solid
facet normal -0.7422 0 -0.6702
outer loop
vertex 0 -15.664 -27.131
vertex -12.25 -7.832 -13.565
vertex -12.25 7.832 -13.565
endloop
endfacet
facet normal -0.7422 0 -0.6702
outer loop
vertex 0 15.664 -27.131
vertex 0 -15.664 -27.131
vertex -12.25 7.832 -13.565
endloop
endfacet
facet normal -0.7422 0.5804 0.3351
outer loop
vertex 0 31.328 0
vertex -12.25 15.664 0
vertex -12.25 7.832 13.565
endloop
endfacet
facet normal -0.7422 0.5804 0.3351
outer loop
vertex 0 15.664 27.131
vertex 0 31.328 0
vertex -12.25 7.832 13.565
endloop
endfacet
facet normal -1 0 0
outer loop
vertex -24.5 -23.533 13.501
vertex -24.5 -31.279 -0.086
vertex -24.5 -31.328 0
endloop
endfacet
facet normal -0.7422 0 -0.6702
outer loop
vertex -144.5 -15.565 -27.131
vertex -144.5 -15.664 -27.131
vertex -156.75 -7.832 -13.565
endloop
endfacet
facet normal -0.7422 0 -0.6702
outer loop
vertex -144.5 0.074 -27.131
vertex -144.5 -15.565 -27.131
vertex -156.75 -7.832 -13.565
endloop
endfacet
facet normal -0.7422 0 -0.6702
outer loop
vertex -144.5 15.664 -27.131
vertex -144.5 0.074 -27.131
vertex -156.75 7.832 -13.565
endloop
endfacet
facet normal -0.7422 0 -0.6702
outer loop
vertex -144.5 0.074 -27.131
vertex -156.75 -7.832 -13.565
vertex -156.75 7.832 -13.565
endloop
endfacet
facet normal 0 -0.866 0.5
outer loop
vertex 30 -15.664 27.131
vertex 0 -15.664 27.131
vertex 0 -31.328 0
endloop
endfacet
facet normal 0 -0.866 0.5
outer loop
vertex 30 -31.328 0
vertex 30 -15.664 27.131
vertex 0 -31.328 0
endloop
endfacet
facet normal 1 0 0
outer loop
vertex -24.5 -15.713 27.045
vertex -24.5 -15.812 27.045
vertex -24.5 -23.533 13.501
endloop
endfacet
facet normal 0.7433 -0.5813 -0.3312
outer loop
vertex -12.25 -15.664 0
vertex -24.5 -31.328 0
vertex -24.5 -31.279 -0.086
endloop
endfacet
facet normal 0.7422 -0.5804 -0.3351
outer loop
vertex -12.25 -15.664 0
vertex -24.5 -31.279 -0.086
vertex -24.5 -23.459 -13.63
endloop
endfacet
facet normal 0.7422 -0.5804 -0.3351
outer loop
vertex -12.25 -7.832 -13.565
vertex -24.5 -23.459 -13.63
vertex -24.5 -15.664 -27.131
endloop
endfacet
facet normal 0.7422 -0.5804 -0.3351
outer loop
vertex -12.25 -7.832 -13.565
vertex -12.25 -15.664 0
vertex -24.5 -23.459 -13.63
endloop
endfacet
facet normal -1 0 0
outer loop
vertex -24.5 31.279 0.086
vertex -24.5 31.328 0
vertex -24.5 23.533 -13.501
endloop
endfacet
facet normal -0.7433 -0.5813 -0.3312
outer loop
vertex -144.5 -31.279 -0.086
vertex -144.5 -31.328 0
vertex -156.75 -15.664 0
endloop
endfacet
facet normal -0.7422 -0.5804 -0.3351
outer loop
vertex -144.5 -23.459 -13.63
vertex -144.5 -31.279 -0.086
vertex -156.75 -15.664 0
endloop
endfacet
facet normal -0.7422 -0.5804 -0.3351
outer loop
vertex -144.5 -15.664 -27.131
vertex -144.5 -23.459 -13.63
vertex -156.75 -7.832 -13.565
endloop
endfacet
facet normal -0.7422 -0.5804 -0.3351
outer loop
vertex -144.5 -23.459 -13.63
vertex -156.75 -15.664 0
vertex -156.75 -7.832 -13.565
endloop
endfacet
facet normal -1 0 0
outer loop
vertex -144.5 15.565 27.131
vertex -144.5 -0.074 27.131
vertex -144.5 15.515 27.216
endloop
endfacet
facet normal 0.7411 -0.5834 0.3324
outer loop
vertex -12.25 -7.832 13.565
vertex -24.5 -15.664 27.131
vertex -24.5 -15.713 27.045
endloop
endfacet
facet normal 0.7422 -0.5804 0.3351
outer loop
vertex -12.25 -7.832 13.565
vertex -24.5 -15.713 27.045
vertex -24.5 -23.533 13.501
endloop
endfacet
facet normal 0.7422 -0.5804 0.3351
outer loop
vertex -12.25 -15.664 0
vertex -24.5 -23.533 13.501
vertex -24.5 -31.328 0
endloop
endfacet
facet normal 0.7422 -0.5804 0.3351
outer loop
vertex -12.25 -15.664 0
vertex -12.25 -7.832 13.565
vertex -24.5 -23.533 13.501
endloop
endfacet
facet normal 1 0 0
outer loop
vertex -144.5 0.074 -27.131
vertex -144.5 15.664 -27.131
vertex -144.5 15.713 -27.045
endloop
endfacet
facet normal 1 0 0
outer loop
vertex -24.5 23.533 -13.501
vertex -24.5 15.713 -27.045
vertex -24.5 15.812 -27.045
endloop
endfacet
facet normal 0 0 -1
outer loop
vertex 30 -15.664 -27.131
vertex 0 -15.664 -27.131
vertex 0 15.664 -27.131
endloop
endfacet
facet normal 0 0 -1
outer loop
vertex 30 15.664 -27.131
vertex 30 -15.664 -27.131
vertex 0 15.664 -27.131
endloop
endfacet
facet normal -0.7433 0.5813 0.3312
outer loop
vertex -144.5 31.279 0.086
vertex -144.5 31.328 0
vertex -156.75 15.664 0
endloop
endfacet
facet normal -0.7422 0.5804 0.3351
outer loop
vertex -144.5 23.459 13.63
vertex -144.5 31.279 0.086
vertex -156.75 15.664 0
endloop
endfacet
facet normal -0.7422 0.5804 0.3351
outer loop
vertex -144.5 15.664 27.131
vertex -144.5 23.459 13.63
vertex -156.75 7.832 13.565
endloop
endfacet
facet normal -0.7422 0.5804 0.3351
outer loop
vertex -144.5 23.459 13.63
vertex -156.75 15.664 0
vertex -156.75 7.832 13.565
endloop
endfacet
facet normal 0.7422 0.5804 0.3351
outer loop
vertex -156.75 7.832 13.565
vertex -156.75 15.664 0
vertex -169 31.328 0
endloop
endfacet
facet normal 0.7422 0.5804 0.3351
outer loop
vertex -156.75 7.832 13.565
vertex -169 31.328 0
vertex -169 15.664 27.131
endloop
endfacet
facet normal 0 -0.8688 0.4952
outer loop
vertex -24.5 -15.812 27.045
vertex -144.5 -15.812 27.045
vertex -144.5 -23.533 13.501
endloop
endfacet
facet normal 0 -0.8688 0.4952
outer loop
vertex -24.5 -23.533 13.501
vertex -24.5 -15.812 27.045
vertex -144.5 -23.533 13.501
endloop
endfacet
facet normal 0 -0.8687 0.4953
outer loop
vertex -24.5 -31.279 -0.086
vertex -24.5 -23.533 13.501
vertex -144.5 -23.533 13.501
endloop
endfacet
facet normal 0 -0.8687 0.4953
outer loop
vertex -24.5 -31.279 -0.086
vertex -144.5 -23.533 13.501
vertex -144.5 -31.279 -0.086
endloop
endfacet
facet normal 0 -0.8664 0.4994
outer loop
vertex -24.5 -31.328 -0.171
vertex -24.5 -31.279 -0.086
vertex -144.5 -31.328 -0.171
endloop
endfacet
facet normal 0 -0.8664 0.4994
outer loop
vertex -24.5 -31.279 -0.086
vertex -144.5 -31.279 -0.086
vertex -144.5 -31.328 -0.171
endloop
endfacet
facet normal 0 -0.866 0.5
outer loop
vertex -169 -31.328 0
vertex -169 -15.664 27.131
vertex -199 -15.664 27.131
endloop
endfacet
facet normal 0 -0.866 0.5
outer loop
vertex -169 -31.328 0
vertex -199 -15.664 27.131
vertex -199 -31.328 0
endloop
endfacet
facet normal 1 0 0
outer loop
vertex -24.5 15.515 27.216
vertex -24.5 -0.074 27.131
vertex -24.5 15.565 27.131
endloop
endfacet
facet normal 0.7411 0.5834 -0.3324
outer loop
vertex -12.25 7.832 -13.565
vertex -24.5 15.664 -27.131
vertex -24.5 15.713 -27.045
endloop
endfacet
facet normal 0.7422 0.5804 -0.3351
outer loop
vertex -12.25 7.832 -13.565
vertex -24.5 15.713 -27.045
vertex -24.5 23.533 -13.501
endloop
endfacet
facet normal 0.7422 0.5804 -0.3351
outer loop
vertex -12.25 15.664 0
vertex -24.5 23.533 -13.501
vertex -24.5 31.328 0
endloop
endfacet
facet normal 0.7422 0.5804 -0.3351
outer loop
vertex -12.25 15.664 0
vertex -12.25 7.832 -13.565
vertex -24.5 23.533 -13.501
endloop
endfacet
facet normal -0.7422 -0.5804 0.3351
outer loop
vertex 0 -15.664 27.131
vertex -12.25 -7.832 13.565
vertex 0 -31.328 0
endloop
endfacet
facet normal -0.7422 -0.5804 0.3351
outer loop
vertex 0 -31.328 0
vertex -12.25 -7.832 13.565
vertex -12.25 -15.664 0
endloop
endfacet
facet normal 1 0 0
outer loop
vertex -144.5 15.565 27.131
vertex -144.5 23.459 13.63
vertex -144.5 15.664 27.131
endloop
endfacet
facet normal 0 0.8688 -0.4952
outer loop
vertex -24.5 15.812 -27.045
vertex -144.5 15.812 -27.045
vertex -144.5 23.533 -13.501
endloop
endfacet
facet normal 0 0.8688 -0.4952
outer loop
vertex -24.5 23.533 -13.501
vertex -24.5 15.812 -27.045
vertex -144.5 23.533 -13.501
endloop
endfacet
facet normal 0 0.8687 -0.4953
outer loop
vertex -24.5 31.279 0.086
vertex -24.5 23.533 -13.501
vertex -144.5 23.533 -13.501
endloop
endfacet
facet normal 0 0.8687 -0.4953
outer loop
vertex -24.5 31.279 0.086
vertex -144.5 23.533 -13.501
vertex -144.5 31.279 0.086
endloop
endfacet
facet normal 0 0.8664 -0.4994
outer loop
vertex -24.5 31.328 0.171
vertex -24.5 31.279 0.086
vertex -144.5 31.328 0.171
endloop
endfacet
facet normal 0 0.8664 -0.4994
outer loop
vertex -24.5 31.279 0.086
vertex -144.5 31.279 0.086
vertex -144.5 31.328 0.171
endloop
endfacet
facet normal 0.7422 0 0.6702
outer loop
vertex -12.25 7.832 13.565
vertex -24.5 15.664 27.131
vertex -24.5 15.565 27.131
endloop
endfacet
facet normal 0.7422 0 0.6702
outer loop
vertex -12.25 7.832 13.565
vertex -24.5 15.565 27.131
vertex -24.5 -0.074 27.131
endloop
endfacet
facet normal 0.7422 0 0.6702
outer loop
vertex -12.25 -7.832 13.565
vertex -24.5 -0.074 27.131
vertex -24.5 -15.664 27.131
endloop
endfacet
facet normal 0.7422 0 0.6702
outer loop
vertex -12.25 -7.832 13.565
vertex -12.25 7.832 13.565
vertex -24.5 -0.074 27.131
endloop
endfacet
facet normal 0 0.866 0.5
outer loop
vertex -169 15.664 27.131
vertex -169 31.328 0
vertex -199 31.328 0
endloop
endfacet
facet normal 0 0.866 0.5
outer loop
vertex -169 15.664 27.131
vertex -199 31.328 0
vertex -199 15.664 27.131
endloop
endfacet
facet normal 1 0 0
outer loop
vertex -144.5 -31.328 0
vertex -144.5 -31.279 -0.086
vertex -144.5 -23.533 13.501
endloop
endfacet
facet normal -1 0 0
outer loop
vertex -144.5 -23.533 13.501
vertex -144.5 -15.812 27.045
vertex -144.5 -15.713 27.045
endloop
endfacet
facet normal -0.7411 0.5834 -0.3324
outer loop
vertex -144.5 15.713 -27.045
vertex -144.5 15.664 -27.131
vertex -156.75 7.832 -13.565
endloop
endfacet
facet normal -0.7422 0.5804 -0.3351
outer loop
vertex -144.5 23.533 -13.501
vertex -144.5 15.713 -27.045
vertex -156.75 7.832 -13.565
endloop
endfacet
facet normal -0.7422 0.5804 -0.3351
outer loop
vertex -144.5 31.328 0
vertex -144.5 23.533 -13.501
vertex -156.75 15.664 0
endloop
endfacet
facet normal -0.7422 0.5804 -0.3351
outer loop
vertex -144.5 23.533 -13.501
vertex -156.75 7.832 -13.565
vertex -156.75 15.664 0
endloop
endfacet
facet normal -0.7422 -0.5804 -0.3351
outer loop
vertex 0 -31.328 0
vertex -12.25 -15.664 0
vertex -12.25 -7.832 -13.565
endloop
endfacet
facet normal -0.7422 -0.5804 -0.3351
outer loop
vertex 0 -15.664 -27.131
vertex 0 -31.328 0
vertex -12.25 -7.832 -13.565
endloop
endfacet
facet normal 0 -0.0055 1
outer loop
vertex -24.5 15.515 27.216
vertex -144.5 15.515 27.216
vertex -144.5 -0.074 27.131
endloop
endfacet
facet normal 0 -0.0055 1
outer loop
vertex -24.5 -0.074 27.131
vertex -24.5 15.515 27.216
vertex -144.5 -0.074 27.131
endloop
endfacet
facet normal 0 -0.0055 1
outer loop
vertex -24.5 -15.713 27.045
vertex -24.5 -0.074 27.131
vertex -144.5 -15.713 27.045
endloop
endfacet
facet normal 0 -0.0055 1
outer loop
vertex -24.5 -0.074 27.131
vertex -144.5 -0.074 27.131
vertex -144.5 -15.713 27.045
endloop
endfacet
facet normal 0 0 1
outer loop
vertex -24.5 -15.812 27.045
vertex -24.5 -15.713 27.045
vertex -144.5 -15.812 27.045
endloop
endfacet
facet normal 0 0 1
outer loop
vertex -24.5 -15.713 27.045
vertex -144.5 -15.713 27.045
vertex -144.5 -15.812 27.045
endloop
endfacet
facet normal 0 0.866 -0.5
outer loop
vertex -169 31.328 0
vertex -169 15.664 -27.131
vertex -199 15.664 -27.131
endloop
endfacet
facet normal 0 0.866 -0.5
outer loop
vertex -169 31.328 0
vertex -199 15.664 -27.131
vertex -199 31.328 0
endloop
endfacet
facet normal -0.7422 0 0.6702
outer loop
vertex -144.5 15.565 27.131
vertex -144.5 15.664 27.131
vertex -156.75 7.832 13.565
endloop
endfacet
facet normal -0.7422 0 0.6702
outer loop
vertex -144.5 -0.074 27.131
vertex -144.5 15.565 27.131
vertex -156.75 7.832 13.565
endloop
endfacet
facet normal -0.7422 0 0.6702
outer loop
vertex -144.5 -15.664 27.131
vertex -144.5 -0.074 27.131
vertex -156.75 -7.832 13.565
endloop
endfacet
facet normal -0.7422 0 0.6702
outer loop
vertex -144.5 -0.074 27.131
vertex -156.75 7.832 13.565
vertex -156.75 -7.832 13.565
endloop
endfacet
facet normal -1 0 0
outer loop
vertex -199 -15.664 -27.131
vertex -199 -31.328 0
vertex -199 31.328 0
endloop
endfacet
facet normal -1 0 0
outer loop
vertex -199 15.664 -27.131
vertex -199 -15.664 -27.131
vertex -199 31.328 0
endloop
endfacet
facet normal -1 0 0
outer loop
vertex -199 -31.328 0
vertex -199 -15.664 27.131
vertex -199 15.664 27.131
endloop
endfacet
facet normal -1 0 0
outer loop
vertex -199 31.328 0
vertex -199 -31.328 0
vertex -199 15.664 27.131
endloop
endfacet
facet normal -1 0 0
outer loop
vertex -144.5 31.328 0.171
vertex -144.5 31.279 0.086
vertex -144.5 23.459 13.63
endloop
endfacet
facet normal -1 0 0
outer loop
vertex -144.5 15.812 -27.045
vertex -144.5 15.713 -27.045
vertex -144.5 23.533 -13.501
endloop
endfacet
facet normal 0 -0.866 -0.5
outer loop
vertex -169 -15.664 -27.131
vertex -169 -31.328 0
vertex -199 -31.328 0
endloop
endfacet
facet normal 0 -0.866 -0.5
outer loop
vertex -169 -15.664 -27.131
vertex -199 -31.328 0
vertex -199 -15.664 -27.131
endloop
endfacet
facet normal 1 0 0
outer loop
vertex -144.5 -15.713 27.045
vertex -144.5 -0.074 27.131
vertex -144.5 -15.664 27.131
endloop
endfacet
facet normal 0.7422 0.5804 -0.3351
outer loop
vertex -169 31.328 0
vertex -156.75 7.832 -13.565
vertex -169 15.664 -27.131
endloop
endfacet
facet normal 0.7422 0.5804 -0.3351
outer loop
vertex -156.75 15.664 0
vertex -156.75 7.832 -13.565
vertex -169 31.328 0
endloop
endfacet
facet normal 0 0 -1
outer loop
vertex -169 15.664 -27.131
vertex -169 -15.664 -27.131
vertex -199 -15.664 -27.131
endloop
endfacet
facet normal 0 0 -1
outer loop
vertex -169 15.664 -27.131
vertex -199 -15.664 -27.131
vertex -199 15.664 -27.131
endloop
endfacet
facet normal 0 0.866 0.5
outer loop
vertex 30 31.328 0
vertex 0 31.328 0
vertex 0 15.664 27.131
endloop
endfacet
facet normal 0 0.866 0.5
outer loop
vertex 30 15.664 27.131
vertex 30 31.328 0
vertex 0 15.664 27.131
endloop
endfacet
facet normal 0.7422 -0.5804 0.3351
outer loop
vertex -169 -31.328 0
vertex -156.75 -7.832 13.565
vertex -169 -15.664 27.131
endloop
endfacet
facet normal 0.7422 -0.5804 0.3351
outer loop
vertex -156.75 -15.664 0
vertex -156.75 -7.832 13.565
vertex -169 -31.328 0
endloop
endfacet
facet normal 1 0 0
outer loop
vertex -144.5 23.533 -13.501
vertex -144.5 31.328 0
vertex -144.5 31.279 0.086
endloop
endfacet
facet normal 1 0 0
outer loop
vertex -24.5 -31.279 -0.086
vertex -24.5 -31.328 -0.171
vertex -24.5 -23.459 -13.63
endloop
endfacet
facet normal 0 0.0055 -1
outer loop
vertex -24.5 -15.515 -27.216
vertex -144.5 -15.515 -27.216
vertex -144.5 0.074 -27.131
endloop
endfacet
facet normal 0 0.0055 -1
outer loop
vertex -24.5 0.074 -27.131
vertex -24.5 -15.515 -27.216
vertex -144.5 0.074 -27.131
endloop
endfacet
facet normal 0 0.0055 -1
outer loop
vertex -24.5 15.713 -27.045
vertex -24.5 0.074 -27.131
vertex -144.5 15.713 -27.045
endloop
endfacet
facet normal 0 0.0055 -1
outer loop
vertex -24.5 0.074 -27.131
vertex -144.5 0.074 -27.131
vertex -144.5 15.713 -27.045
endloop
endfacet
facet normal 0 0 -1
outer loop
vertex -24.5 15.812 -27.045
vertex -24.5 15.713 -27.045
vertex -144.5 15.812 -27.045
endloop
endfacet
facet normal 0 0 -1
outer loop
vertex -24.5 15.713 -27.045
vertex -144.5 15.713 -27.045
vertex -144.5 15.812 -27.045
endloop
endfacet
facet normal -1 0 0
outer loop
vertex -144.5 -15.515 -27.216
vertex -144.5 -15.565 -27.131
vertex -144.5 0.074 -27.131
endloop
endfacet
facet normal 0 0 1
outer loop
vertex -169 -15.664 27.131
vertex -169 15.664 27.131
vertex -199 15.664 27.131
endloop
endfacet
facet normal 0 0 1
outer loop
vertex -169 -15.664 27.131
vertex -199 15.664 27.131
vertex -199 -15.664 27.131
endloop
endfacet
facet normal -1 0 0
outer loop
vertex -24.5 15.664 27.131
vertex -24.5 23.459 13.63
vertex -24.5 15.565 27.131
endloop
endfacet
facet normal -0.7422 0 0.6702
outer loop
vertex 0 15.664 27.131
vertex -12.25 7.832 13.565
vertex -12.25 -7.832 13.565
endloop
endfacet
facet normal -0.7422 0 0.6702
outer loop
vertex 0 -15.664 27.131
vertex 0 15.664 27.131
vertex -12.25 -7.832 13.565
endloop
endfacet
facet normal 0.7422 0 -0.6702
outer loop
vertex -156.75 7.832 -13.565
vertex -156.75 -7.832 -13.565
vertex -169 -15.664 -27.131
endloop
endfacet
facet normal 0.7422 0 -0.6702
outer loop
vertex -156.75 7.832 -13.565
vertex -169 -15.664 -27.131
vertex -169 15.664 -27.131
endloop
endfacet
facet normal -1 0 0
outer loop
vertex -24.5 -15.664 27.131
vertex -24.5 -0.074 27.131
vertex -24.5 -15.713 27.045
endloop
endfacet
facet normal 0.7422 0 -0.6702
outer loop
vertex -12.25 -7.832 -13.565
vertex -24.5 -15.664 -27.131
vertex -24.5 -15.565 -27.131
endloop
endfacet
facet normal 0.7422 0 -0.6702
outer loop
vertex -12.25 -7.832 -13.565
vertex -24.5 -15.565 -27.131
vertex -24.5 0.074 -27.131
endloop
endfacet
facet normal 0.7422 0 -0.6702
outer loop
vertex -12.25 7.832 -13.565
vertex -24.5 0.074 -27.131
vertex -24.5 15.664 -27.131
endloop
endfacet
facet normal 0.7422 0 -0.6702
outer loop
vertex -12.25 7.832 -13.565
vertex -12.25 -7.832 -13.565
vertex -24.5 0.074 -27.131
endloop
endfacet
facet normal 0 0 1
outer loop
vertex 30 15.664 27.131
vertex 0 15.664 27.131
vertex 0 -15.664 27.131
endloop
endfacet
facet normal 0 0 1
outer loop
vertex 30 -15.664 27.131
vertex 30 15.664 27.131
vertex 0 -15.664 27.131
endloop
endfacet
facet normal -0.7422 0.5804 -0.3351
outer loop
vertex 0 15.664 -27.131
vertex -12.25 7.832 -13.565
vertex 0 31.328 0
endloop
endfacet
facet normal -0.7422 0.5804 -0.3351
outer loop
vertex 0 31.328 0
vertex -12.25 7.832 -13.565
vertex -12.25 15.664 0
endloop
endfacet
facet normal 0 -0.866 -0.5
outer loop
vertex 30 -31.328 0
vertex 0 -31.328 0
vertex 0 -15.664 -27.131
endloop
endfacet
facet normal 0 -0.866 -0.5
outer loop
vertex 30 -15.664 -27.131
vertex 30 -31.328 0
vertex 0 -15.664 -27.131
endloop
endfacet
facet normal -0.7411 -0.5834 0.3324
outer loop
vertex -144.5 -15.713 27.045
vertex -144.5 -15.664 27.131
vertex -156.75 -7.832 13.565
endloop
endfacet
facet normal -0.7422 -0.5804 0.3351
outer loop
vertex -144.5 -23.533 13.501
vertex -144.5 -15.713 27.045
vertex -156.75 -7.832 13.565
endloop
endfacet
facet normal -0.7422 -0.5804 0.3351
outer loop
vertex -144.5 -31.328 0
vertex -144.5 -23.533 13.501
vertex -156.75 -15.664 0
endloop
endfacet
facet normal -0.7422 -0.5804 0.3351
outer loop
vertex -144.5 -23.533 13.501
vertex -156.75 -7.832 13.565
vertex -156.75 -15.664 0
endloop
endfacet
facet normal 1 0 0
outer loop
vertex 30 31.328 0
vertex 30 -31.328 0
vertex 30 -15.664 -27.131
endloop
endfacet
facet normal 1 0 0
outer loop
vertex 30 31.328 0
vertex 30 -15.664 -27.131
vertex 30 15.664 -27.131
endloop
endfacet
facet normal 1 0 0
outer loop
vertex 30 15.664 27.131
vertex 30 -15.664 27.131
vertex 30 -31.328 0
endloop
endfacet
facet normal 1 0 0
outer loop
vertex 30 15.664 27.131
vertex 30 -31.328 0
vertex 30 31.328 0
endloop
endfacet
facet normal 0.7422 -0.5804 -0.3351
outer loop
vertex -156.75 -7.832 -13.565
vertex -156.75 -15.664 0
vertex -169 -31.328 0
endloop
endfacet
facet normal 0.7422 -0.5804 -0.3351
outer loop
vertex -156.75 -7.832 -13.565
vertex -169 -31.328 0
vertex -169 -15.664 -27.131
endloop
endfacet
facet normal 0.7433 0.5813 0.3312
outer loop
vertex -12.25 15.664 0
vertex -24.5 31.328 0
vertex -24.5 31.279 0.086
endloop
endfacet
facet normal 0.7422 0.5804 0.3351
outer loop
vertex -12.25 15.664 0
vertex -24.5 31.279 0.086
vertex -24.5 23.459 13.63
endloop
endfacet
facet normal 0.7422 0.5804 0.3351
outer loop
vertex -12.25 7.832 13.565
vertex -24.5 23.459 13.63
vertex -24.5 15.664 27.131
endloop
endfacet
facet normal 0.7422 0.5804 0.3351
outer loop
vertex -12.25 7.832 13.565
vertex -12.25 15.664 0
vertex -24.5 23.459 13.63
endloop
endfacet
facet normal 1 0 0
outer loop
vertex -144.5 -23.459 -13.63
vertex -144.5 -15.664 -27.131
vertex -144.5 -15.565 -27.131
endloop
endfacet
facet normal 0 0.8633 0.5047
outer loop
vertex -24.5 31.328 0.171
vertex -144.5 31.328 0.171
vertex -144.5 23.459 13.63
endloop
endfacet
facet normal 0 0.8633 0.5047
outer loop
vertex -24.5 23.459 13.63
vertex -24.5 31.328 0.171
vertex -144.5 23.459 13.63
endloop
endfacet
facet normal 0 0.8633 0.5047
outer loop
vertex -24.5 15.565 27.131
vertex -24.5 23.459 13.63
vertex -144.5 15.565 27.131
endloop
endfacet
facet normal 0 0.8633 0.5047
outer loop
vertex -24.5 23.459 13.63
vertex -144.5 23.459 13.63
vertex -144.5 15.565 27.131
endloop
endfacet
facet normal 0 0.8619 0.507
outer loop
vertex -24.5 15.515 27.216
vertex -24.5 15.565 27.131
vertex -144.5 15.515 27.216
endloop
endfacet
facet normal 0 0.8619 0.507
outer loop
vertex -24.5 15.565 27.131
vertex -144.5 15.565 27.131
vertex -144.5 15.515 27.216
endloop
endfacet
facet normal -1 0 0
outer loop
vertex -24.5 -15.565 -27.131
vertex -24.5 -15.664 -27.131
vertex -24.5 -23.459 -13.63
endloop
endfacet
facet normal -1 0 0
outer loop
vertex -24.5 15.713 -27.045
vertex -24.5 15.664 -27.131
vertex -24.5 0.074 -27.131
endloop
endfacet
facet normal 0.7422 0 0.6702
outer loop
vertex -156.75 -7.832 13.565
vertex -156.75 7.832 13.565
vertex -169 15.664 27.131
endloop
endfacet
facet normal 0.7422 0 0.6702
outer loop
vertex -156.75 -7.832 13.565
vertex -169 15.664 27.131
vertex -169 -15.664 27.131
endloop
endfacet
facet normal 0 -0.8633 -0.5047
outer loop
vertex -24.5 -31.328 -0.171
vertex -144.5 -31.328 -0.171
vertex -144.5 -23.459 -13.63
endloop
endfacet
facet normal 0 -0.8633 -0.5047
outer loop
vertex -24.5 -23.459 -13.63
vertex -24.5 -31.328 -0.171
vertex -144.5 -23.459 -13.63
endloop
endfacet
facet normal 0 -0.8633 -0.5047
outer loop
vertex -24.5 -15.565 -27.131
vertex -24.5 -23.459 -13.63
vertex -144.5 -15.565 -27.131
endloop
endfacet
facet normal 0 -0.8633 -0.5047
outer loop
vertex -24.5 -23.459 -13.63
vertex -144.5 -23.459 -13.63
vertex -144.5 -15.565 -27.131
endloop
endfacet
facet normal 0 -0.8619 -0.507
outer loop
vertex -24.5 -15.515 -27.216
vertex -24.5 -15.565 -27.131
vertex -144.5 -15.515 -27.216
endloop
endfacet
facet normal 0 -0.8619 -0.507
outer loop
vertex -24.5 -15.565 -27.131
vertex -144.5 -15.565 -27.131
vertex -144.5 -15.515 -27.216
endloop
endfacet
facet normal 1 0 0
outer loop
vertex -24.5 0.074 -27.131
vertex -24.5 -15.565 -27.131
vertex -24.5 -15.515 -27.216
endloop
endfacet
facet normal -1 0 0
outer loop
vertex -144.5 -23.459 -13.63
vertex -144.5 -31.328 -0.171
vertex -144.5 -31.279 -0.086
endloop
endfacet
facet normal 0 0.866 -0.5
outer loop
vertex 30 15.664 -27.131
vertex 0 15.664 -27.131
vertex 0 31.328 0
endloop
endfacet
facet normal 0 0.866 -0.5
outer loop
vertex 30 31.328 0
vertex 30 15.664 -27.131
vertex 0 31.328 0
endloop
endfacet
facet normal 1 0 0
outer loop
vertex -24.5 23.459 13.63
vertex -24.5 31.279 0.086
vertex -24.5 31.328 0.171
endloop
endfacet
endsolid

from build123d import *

# Parameters (mm, degrees)
F1_DEPTH = 30
F4_DEPTH = 60


with BuildPart() as f1:
    # F0 (on Right) → F1 (new body)
    with BuildSketch(Plane.YZ):
        Polygon((15.664, -27.1308438498), (31.328, 0), (15.664, 27.1308438498), (-15.664, 27.1308438498), (-31.328, 0), (-15.664, -27.1308438498), align=None)
    extrude(amount=F1_DEPTH)



with BuildPart() as f4:
    # F3 (on offset) → F4 (new body)
    with BuildSketch(Plane.YZ.offset(-24.5)):
        Polygon((15.8121267025, -27.0447819948), (31.3275315985, 0.1713124148), (15.515404896, 27.2160944096), (-15.8121267025, 27.0447819948), (-31.3275315985, -0.1713124148), (-15.515404896, -27.2160944096), align=None)
    extrude(amount=-F4_DEPTH)


with BuildPart() as f1_1:
    add(f1.part)

    add(f4.part)  # F8 merges F4
    # F6 (on Right) → F8 section 0
    with BuildSketch(Plane.YZ, mode=Mode.PRIVATE) as f8_s0:
        Polygon((15.664, -27.1308438498), (31.328, 0), (15.664, 27.1308438498), (-15.664, 27.1308438498), (-31.328, 0), (-15.664, -27.1308438498), align=None)
    loft([f8_s0.sketch, Vertex(-24.5, 0, 0)])

    # F7 (on offset) → F9 section 0
    with BuildSketch(Plane.YZ.offset(-24.5), mode=Mode.PRIVATE) as f9_s0:
        Polygon((15.664, -27.1308438498), (31.328, 0), (15.664, 27.1308438498), (-15.664, 27.1308438498), (-31.328, 0), (-15.664, -27.1308438498), align=None)
    loft([f9_s0.sketch, Vertex(0, 0, 0)])

    # F10: F1 across plane


with BuildPart() as f1_2:
    add(f1_1.part)
    add(f1_1.part.mirror(Plane(origin=(-84.5, 0, 0), x_dir=(0, 1, 0), z_dir=(-1, 0, 0))))


solid = f1_2.part
